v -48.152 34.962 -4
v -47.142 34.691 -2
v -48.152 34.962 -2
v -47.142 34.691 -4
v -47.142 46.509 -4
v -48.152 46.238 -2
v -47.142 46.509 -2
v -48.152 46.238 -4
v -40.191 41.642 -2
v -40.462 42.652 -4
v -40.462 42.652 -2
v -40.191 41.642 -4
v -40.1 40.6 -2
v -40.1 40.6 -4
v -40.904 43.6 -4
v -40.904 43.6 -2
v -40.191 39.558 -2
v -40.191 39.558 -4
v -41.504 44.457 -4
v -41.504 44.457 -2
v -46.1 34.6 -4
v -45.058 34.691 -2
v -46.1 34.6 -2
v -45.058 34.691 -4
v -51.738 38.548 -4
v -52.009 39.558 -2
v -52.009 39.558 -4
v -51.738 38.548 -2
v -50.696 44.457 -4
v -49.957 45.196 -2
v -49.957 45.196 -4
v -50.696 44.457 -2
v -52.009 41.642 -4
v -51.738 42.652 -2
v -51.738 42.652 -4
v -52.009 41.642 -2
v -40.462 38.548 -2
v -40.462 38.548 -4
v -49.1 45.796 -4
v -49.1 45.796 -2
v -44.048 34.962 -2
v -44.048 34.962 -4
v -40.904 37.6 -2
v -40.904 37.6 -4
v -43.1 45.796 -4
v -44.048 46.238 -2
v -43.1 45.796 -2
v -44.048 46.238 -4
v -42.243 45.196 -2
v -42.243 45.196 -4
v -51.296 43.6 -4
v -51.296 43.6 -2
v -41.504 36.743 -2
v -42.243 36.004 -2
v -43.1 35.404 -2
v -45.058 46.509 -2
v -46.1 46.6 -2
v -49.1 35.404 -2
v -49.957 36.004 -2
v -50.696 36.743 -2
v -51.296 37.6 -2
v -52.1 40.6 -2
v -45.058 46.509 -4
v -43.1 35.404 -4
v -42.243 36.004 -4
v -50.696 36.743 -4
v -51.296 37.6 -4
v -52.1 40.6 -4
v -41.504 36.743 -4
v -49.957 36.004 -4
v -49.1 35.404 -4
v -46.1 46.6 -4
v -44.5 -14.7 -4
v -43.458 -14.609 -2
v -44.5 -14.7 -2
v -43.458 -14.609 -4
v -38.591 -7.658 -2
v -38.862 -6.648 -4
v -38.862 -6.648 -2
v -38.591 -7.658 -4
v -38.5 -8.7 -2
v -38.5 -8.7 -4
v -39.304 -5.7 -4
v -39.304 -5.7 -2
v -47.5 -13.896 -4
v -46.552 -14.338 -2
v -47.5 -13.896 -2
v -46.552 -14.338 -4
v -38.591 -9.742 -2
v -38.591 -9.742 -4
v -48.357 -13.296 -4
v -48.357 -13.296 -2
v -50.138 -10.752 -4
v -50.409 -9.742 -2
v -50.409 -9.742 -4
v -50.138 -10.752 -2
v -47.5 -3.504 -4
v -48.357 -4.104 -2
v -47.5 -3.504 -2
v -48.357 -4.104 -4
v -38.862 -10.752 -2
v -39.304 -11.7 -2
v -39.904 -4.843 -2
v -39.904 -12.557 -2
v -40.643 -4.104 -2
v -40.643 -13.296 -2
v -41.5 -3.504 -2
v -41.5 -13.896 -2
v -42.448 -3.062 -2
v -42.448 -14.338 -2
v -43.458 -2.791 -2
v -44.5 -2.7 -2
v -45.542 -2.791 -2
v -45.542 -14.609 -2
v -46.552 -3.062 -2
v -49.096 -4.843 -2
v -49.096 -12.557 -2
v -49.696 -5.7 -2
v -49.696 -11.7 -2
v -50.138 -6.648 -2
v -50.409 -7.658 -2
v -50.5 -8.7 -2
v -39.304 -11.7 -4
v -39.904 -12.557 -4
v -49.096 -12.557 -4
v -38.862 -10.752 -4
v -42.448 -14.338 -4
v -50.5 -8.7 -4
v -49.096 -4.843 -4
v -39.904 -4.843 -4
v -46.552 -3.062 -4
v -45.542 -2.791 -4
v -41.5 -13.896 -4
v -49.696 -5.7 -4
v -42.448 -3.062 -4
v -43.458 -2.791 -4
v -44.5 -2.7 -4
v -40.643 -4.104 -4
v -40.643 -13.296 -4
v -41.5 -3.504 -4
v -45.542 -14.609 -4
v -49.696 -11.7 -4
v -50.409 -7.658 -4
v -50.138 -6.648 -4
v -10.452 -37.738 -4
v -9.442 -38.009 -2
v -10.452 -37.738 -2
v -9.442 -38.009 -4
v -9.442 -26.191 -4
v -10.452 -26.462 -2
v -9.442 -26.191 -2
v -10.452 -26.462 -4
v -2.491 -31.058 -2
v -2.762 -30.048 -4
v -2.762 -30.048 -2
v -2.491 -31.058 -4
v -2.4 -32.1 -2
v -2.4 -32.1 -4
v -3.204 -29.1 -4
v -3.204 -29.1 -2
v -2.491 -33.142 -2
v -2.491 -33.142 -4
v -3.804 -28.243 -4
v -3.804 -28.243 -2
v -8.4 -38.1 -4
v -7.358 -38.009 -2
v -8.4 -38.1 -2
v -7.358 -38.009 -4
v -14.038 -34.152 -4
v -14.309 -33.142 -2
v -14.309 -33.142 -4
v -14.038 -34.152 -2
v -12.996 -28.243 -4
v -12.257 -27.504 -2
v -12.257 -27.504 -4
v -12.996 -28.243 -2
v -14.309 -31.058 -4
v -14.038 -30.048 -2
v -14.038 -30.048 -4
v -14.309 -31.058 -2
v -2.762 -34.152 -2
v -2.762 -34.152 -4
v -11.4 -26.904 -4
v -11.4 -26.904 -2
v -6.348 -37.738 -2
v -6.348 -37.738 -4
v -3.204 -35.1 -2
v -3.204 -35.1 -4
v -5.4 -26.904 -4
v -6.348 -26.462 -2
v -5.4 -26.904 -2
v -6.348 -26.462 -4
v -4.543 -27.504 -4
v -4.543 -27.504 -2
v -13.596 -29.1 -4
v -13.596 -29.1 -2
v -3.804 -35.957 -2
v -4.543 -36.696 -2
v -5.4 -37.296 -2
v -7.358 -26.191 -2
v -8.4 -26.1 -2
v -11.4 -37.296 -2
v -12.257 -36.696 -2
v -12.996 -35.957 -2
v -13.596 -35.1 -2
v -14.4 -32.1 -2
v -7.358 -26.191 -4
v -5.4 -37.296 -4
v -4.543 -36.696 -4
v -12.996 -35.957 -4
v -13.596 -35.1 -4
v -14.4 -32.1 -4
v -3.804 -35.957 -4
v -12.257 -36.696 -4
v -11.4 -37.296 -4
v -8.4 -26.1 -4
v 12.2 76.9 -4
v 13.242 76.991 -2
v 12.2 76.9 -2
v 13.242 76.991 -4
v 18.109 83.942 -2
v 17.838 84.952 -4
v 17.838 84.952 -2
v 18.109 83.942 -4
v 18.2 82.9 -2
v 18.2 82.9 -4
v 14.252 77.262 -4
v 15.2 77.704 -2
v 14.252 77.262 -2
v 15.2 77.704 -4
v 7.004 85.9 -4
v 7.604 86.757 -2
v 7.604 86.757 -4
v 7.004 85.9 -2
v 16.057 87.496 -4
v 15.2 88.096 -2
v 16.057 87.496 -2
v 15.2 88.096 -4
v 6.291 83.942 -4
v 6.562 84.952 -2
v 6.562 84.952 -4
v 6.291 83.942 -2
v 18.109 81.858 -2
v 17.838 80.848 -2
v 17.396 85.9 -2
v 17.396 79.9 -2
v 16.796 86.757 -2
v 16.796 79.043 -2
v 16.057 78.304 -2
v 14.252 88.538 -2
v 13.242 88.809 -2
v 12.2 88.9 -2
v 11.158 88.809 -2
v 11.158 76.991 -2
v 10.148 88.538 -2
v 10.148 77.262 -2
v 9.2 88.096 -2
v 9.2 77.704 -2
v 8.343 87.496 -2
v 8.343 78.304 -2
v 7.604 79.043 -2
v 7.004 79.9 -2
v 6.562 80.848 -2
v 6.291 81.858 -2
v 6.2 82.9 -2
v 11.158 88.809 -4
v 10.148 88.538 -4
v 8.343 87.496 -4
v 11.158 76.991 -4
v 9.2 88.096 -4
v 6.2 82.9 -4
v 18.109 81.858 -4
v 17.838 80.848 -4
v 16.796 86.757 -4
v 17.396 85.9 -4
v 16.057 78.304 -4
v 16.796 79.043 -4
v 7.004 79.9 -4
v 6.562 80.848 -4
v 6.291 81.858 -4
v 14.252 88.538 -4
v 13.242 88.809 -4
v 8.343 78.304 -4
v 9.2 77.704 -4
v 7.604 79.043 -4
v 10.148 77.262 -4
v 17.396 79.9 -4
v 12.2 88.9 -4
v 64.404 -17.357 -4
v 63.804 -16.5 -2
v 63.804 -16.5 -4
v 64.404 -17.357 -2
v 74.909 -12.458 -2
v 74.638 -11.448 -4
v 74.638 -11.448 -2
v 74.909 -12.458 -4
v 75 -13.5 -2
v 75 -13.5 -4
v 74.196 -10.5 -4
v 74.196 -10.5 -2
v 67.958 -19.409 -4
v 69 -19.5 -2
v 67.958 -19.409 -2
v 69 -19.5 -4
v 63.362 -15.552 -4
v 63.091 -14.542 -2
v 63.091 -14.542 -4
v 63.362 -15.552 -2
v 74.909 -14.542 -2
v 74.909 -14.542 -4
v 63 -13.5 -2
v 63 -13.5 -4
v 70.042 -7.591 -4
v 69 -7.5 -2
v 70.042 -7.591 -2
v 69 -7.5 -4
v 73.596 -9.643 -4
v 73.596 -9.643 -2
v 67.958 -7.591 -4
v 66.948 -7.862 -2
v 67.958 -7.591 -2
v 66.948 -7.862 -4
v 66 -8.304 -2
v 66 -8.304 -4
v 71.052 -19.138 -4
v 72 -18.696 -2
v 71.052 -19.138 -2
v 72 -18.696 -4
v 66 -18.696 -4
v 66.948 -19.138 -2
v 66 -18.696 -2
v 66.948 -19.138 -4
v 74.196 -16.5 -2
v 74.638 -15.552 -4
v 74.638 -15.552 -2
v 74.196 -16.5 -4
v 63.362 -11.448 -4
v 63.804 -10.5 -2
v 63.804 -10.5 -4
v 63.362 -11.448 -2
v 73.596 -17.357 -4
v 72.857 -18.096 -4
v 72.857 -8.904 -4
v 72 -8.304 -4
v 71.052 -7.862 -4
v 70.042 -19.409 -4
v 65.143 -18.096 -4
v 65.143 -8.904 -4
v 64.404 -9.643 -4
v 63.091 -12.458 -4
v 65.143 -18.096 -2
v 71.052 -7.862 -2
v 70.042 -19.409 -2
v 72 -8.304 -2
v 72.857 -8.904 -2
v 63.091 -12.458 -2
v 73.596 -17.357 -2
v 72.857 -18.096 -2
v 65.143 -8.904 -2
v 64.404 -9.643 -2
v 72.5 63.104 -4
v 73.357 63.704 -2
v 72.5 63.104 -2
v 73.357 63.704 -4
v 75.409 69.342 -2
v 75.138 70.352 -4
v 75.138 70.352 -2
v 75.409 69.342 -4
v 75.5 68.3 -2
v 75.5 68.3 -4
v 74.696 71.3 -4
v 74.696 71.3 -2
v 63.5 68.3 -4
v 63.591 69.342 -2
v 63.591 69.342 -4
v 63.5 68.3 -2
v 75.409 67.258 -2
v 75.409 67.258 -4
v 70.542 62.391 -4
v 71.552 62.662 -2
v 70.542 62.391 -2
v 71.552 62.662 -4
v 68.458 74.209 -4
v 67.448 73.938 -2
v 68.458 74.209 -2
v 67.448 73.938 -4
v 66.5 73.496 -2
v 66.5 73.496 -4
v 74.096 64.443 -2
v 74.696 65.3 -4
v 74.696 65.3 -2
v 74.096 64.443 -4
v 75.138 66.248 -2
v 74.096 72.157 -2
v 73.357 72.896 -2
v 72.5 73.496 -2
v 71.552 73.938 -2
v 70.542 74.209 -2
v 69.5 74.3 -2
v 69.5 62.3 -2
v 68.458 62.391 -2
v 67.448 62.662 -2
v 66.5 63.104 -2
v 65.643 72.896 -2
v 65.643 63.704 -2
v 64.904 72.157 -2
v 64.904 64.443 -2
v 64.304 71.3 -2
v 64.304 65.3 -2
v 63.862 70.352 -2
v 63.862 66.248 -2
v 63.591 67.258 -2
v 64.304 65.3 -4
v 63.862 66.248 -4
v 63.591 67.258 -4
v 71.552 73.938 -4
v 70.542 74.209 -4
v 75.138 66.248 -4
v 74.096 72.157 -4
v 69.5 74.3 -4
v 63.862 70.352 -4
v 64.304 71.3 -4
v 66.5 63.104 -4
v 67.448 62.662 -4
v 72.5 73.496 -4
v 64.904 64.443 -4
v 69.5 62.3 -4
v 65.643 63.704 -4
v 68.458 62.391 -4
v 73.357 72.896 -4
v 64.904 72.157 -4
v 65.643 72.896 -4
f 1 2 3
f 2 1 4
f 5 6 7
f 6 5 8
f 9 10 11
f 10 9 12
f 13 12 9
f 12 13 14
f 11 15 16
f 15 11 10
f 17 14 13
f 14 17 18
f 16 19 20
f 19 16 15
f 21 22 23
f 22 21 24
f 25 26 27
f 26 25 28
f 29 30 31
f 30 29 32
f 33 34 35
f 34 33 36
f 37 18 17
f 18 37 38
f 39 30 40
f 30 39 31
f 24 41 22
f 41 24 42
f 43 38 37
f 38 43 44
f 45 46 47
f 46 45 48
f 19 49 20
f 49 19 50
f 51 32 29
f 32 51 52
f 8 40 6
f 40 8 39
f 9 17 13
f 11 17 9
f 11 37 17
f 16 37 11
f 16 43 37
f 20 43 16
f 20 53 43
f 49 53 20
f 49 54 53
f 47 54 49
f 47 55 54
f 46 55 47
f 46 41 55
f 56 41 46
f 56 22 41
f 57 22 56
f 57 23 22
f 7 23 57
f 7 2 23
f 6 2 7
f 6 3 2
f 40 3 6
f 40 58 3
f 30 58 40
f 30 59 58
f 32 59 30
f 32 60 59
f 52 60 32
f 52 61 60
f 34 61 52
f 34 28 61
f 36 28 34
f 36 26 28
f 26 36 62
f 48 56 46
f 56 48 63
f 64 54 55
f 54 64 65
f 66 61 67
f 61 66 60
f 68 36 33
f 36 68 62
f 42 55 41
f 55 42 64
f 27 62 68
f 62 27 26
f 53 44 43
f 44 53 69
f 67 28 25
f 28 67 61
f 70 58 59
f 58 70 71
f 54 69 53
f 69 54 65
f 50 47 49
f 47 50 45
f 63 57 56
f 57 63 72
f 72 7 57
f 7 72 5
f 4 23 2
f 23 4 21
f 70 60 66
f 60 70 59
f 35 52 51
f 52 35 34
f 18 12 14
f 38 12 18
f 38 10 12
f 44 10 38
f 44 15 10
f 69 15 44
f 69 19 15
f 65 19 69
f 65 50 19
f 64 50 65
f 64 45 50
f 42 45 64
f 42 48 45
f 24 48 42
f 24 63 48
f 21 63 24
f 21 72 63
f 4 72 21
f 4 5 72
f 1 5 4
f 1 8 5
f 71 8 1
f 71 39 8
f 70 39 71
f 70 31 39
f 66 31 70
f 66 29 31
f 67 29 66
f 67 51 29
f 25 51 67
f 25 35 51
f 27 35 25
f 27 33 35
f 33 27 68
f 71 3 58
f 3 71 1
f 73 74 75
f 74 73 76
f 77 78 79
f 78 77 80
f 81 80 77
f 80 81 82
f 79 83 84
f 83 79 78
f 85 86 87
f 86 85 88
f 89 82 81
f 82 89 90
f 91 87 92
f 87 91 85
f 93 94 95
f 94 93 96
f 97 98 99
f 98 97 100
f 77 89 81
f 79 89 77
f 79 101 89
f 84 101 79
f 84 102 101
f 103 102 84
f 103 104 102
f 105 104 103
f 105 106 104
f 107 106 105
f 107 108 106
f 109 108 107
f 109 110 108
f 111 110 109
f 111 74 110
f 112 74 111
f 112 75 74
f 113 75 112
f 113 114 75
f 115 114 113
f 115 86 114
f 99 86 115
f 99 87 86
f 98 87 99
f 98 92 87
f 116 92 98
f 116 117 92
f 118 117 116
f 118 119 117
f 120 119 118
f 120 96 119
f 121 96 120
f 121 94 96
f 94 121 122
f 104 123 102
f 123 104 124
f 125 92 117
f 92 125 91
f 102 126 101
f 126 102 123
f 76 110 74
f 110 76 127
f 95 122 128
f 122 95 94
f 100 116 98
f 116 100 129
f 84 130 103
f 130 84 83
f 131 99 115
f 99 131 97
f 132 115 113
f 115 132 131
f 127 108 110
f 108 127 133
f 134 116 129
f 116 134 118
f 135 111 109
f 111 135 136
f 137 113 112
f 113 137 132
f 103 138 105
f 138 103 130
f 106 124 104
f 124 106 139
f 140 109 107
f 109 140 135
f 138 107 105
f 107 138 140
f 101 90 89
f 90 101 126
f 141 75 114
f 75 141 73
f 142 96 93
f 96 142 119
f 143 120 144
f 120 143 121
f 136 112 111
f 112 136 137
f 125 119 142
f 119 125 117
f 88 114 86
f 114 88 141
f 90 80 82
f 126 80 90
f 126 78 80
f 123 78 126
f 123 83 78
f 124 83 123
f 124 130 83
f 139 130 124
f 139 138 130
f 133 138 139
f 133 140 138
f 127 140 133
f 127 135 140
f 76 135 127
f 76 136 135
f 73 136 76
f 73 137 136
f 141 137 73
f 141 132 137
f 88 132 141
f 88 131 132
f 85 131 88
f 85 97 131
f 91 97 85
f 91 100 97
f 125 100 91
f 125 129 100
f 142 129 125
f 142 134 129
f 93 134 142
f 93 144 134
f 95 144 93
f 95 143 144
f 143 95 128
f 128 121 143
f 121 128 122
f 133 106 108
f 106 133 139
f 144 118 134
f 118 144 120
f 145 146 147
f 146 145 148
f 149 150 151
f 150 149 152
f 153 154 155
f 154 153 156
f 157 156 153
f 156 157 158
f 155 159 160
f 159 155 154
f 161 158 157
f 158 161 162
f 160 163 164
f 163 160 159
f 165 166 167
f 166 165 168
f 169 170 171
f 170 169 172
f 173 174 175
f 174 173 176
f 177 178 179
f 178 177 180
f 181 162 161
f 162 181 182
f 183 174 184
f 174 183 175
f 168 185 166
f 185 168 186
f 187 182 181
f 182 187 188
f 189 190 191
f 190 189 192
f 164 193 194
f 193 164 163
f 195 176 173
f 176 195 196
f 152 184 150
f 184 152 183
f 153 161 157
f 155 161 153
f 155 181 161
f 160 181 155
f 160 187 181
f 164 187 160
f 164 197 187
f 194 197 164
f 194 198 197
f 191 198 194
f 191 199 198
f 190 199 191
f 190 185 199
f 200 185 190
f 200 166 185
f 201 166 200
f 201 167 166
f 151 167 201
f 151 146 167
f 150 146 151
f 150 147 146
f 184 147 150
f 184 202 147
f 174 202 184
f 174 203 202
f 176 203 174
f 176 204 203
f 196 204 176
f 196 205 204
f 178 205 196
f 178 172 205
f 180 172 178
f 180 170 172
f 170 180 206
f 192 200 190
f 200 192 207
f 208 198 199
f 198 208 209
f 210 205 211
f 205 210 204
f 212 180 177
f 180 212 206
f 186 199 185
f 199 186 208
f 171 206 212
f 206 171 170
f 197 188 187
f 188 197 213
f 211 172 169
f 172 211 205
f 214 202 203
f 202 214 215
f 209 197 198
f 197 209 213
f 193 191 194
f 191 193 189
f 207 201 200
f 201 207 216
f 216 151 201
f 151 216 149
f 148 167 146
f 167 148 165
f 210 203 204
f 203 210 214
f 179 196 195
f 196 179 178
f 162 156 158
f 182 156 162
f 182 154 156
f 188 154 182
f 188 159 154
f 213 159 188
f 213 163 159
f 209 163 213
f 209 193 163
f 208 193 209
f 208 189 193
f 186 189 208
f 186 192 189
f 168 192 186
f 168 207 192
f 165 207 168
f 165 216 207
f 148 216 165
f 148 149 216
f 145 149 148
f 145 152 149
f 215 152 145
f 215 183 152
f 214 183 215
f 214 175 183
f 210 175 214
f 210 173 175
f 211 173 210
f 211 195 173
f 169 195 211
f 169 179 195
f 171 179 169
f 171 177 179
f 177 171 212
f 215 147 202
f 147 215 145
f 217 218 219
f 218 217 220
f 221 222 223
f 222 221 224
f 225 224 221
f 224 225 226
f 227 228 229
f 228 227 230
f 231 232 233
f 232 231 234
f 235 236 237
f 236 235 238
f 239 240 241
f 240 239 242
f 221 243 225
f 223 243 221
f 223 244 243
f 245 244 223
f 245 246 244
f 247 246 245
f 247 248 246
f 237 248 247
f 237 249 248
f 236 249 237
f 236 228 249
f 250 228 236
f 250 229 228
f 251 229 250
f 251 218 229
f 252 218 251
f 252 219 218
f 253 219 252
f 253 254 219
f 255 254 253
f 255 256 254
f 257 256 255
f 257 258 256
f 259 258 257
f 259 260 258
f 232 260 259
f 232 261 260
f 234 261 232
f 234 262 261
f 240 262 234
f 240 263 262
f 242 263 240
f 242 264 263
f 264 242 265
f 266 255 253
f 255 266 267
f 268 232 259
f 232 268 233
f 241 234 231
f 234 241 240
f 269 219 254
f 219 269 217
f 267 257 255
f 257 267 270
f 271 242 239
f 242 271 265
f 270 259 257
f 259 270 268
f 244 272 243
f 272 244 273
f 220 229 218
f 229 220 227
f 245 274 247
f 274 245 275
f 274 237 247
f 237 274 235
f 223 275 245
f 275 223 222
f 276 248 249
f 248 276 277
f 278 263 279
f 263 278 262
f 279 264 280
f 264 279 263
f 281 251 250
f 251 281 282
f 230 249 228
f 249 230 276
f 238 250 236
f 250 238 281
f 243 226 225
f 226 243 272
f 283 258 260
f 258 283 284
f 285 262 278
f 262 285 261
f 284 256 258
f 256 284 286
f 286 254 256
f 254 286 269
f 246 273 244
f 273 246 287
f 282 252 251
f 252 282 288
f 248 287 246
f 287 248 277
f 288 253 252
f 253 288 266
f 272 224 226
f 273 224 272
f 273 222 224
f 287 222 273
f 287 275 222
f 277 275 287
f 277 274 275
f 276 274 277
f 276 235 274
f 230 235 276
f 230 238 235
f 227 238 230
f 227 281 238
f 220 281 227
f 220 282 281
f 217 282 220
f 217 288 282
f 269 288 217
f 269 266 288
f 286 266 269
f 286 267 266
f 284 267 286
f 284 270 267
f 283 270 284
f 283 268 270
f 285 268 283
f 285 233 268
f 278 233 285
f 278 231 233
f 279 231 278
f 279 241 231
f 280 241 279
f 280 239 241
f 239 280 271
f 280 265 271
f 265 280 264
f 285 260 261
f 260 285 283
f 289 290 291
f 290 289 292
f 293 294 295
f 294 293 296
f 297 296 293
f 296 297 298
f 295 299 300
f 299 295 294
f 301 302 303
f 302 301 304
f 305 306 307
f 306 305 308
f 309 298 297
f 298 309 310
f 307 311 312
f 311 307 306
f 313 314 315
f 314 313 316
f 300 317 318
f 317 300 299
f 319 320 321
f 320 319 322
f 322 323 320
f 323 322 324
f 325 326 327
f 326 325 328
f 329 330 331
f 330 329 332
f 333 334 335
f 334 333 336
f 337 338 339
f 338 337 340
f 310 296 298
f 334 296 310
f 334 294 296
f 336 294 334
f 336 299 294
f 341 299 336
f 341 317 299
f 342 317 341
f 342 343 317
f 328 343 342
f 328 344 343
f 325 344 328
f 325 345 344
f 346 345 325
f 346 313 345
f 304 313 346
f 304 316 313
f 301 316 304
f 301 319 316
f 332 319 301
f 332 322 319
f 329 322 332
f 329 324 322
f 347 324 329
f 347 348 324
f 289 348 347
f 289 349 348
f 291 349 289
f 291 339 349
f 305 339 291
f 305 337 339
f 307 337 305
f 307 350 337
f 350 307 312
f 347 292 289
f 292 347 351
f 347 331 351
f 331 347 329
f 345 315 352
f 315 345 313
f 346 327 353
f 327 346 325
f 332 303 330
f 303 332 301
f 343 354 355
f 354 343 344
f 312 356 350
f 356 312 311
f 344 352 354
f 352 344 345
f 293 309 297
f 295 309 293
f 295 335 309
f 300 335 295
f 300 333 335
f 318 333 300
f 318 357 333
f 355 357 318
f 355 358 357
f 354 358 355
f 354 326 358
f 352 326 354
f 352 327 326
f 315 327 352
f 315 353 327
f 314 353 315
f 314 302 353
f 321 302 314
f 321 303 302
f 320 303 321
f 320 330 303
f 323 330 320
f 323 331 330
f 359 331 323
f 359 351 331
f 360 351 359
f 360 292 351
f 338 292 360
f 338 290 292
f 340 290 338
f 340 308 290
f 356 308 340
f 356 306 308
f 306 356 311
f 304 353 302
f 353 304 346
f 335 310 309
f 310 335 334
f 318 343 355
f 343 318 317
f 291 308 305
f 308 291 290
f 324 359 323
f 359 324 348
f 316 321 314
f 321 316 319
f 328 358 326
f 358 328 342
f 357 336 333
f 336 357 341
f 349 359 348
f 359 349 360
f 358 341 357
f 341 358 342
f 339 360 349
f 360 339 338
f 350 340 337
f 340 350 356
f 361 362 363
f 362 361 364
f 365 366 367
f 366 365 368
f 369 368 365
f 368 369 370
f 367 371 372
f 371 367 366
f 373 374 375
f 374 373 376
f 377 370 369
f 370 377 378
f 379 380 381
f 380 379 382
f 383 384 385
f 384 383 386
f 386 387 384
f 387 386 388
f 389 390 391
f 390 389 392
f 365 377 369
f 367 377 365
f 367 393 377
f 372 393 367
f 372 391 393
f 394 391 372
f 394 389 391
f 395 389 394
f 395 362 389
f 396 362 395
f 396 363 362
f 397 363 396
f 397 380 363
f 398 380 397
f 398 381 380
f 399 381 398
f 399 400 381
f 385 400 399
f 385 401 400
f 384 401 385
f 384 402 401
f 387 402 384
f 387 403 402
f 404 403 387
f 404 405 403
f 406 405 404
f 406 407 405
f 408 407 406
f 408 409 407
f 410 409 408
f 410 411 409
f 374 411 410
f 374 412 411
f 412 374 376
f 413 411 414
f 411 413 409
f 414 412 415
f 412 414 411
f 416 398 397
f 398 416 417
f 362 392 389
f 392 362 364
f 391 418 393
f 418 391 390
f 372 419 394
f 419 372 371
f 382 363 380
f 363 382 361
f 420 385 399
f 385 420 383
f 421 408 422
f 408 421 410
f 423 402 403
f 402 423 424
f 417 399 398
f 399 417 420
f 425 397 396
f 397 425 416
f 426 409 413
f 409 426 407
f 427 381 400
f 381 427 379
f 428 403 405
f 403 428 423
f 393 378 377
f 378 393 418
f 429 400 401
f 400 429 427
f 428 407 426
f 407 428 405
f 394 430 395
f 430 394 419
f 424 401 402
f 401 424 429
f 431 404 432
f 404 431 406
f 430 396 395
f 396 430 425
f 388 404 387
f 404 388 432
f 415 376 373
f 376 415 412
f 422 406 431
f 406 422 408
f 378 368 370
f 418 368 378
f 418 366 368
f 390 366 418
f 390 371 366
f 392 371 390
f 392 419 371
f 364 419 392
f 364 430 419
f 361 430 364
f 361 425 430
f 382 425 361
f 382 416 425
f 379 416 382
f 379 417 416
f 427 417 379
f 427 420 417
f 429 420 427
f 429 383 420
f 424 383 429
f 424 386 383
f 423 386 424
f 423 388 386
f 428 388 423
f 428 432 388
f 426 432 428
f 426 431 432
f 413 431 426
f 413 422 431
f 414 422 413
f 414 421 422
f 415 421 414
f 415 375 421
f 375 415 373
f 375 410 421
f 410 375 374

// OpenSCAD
PTS=[[134.9-181,40.6],[136.5-181,-8.7],[172.6-181,-32.1],[193.2-181,82.9],[250.0-181,-13.5],[250.5-181,68.3]];
for(p=PTS) translate([p[0],p[1],-3]) cylinder(h=2,d=12,center=true,$fn=36);   // in keyboard cover (z -4..-2)
